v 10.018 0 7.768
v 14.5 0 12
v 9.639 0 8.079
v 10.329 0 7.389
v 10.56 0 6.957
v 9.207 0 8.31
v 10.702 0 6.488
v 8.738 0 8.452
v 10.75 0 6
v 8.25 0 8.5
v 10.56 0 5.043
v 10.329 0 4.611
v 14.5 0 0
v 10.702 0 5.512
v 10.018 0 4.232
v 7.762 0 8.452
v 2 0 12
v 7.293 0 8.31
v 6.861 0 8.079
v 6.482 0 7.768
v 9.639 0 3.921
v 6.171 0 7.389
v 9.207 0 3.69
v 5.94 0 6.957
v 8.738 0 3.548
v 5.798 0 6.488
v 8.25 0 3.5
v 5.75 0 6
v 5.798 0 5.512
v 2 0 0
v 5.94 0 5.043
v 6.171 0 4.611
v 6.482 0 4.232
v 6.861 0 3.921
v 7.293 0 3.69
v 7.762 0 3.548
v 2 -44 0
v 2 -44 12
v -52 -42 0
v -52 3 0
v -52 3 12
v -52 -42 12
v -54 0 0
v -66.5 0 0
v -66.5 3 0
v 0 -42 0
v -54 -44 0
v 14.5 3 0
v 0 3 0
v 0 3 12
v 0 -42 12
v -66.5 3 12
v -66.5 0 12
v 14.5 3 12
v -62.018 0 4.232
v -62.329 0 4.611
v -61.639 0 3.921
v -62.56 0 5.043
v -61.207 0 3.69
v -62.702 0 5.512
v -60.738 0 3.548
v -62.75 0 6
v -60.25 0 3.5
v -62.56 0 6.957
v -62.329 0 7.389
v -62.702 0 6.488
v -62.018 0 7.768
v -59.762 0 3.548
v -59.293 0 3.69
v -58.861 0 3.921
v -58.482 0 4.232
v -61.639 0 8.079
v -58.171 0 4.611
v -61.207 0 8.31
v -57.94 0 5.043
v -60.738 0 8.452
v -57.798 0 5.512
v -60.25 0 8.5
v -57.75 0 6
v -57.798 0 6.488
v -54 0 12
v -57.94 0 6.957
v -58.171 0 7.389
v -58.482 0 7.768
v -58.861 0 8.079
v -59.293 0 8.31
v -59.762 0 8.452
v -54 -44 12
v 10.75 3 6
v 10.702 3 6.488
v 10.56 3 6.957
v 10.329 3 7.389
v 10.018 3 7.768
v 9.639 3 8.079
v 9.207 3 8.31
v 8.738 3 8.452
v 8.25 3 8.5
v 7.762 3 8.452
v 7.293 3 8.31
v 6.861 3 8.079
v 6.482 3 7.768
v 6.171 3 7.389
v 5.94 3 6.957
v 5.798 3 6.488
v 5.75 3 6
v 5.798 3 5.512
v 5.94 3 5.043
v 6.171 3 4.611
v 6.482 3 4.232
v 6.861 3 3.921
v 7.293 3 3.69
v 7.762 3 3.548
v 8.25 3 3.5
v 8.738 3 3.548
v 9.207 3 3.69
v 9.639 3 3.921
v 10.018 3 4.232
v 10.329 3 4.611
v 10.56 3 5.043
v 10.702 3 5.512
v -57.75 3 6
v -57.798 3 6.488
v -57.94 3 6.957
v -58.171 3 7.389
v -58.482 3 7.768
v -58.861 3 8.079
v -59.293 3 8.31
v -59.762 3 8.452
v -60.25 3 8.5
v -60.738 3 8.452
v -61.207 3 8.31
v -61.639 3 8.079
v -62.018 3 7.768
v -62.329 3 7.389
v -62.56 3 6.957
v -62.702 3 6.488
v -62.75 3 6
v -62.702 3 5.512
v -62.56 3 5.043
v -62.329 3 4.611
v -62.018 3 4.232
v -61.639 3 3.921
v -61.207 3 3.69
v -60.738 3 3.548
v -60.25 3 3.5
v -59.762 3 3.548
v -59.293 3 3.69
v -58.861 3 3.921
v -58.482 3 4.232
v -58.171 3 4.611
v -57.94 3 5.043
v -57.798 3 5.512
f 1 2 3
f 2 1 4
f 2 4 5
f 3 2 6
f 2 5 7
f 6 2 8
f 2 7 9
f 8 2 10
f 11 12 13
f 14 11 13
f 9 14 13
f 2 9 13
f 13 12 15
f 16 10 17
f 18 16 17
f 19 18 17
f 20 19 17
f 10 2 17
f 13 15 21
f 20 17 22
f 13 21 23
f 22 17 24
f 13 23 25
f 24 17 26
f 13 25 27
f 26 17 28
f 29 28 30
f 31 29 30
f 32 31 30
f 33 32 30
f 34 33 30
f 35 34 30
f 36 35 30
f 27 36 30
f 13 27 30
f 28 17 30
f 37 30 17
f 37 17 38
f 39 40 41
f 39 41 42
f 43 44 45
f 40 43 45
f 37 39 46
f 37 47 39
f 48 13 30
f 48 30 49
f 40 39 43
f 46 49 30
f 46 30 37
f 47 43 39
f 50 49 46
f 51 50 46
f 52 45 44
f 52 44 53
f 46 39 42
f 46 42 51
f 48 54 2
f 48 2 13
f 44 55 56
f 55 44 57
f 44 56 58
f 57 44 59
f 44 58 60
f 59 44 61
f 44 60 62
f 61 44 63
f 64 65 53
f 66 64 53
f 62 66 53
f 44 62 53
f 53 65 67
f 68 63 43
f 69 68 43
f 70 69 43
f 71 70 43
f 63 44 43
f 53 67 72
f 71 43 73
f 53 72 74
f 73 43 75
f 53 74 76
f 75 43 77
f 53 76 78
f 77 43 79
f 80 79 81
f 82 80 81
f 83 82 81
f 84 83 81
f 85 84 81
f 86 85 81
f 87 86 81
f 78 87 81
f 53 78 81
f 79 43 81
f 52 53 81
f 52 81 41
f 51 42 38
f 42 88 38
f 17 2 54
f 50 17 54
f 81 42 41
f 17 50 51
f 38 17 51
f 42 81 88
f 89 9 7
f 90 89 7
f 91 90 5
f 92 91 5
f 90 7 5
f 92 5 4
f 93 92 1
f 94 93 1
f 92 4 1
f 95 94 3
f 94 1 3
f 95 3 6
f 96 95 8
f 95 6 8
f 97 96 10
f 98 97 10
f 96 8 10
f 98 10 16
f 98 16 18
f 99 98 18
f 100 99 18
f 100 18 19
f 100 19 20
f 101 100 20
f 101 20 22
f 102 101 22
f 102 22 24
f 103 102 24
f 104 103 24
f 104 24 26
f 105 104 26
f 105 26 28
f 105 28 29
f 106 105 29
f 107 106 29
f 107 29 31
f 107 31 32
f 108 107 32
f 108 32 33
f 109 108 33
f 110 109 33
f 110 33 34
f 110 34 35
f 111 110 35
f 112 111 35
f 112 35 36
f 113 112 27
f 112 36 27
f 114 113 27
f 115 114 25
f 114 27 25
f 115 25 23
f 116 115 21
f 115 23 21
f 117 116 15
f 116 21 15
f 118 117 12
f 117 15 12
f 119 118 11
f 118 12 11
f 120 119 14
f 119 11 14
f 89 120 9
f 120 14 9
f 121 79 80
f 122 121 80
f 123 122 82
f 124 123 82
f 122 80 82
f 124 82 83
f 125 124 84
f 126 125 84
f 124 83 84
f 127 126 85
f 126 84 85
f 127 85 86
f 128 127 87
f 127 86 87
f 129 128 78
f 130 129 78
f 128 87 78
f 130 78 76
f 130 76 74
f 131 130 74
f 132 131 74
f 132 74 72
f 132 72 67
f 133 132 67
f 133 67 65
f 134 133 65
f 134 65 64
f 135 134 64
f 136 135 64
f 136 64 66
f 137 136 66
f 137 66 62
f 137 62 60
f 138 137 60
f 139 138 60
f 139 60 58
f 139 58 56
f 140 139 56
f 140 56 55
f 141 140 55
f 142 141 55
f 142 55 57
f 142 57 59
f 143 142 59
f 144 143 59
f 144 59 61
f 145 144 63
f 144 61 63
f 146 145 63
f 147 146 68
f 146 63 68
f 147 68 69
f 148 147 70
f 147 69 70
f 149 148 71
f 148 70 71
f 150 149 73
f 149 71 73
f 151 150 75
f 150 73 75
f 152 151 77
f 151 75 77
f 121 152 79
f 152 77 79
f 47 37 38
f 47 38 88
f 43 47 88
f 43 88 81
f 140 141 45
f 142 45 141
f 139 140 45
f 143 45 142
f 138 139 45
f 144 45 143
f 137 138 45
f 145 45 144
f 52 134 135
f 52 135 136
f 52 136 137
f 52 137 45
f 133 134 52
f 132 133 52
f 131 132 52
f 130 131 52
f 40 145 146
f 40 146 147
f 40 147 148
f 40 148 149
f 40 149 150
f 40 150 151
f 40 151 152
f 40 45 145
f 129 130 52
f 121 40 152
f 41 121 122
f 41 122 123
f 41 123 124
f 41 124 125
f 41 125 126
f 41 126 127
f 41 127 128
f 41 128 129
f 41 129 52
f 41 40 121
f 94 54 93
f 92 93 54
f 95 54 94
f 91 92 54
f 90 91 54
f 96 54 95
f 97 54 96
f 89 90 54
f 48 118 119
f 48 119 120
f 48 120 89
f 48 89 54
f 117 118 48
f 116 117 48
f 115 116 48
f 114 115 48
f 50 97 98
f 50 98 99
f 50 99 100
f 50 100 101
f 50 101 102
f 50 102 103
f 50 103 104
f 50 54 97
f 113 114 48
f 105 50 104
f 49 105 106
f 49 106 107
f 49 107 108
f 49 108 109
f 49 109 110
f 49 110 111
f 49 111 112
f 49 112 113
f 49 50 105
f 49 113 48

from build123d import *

# Parameters (mm, degrees)
BOSS_EXTRUDE1_DEPTH = 12
SKETCH3_W           = 12
SKETCH3_H           = 3
BOSS_EXTRUDE2_DEPTH = 2.5
SKETCH4_W           = 12
SKETCH4_H           = 3
BOSS_EXTRUDE3_DEPTH = 2.5
SKETCH6_R           = 2.5
CUT_EXTRUDE1_DEPTH  = 10
SKETCH7_R           = 2.5
CUT_EXTRUDE2_DEPTH  = 10


with BuildPart() as part:
    # Sketch1 → Boss-Extrude1 (new body)
    with BuildSketch(Plane.XY):
        Polygon((0, 0), (0, 3), (12, 3), (12, 0), (2, 0), (2, -44), (-54, -44), (-54, 0), (-64, 0), (-64, 3), (-52, 3), (-52, -42), (0, -42), align=None)
    extrude(amount=BOSS_EXTRUDE1_DEPTH)

    # Sketch3 → Boss-Extrude2 (add)
    with BuildSketch(Plane(origin=(12, 0, 0), x_dir=(0, 0, -1), z_dir=(1, 0, 0))):
        with Locations((-6, 1.5)):
            Rectangle(SKETCH3_W, SKETCH3_H)
    extrude(amount=BOSS_EXTRUDE2_DEPTH)

    # Sketch4 → Boss-Extrude3 (add)
    with BuildSketch(Plane.ZY.offset(64)):
        with Locations((6, 1.5)):
            Rectangle(SKETCH4_W, SKETCH4_H)
    extrude(amount=BOSS_EXTRUDE3_DEPTH)

    # Sketch6 → Cut-Extrude1 (cut)
    with BuildSketch(Plane.XZ):
        with Locations((-60.25, 6)):
            Circle(SKETCH6_R)
    extrude(amount=-CUT_EXTRUDE1_DEPTH, mode=Mode.SUBTRACT)

    # Sketch7 → Cut-Extrude2 (cut)
    with BuildSketch(Plane.XZ):
        with Locations((8.25, 6)):
            Circle(SKETCH7_R)
    extrude(amount=-CUT_EXTRUDE2_DEPTH, mode=Mode.SUBTRACT)


solid = part.part
